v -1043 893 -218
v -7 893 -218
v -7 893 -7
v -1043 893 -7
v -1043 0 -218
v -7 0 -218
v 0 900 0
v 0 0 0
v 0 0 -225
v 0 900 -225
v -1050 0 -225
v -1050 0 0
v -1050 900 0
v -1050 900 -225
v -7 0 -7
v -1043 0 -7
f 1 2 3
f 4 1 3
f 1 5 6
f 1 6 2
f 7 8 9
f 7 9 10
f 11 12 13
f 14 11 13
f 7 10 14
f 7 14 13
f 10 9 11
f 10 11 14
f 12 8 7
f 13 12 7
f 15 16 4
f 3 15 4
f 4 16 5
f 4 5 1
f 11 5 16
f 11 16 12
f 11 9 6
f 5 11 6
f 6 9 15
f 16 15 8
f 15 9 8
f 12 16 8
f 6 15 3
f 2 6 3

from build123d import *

# Parameters (mm, degrees)
F0_W     = 900
F0_H     = 225
F1_DEPTH = 1050
F2_T     = -7


with BuildPart() as f1:
    # F0 (on Right) → F1 (new body)
    with BuildSketch(Plane.YZ):
        with Locations((450, -112.5)):
            Rectangle(F0_W, F0_H)
    extrude(amount=-F1_DEPTH)

    # F2
    f2_openings = [f1.faces().sort_by_distance(p)[0] for p in [
        (-525, 0, -112.5),
    ]]
    offset(amount=F2_T, openings=f2_openings)


solid = f1.part
